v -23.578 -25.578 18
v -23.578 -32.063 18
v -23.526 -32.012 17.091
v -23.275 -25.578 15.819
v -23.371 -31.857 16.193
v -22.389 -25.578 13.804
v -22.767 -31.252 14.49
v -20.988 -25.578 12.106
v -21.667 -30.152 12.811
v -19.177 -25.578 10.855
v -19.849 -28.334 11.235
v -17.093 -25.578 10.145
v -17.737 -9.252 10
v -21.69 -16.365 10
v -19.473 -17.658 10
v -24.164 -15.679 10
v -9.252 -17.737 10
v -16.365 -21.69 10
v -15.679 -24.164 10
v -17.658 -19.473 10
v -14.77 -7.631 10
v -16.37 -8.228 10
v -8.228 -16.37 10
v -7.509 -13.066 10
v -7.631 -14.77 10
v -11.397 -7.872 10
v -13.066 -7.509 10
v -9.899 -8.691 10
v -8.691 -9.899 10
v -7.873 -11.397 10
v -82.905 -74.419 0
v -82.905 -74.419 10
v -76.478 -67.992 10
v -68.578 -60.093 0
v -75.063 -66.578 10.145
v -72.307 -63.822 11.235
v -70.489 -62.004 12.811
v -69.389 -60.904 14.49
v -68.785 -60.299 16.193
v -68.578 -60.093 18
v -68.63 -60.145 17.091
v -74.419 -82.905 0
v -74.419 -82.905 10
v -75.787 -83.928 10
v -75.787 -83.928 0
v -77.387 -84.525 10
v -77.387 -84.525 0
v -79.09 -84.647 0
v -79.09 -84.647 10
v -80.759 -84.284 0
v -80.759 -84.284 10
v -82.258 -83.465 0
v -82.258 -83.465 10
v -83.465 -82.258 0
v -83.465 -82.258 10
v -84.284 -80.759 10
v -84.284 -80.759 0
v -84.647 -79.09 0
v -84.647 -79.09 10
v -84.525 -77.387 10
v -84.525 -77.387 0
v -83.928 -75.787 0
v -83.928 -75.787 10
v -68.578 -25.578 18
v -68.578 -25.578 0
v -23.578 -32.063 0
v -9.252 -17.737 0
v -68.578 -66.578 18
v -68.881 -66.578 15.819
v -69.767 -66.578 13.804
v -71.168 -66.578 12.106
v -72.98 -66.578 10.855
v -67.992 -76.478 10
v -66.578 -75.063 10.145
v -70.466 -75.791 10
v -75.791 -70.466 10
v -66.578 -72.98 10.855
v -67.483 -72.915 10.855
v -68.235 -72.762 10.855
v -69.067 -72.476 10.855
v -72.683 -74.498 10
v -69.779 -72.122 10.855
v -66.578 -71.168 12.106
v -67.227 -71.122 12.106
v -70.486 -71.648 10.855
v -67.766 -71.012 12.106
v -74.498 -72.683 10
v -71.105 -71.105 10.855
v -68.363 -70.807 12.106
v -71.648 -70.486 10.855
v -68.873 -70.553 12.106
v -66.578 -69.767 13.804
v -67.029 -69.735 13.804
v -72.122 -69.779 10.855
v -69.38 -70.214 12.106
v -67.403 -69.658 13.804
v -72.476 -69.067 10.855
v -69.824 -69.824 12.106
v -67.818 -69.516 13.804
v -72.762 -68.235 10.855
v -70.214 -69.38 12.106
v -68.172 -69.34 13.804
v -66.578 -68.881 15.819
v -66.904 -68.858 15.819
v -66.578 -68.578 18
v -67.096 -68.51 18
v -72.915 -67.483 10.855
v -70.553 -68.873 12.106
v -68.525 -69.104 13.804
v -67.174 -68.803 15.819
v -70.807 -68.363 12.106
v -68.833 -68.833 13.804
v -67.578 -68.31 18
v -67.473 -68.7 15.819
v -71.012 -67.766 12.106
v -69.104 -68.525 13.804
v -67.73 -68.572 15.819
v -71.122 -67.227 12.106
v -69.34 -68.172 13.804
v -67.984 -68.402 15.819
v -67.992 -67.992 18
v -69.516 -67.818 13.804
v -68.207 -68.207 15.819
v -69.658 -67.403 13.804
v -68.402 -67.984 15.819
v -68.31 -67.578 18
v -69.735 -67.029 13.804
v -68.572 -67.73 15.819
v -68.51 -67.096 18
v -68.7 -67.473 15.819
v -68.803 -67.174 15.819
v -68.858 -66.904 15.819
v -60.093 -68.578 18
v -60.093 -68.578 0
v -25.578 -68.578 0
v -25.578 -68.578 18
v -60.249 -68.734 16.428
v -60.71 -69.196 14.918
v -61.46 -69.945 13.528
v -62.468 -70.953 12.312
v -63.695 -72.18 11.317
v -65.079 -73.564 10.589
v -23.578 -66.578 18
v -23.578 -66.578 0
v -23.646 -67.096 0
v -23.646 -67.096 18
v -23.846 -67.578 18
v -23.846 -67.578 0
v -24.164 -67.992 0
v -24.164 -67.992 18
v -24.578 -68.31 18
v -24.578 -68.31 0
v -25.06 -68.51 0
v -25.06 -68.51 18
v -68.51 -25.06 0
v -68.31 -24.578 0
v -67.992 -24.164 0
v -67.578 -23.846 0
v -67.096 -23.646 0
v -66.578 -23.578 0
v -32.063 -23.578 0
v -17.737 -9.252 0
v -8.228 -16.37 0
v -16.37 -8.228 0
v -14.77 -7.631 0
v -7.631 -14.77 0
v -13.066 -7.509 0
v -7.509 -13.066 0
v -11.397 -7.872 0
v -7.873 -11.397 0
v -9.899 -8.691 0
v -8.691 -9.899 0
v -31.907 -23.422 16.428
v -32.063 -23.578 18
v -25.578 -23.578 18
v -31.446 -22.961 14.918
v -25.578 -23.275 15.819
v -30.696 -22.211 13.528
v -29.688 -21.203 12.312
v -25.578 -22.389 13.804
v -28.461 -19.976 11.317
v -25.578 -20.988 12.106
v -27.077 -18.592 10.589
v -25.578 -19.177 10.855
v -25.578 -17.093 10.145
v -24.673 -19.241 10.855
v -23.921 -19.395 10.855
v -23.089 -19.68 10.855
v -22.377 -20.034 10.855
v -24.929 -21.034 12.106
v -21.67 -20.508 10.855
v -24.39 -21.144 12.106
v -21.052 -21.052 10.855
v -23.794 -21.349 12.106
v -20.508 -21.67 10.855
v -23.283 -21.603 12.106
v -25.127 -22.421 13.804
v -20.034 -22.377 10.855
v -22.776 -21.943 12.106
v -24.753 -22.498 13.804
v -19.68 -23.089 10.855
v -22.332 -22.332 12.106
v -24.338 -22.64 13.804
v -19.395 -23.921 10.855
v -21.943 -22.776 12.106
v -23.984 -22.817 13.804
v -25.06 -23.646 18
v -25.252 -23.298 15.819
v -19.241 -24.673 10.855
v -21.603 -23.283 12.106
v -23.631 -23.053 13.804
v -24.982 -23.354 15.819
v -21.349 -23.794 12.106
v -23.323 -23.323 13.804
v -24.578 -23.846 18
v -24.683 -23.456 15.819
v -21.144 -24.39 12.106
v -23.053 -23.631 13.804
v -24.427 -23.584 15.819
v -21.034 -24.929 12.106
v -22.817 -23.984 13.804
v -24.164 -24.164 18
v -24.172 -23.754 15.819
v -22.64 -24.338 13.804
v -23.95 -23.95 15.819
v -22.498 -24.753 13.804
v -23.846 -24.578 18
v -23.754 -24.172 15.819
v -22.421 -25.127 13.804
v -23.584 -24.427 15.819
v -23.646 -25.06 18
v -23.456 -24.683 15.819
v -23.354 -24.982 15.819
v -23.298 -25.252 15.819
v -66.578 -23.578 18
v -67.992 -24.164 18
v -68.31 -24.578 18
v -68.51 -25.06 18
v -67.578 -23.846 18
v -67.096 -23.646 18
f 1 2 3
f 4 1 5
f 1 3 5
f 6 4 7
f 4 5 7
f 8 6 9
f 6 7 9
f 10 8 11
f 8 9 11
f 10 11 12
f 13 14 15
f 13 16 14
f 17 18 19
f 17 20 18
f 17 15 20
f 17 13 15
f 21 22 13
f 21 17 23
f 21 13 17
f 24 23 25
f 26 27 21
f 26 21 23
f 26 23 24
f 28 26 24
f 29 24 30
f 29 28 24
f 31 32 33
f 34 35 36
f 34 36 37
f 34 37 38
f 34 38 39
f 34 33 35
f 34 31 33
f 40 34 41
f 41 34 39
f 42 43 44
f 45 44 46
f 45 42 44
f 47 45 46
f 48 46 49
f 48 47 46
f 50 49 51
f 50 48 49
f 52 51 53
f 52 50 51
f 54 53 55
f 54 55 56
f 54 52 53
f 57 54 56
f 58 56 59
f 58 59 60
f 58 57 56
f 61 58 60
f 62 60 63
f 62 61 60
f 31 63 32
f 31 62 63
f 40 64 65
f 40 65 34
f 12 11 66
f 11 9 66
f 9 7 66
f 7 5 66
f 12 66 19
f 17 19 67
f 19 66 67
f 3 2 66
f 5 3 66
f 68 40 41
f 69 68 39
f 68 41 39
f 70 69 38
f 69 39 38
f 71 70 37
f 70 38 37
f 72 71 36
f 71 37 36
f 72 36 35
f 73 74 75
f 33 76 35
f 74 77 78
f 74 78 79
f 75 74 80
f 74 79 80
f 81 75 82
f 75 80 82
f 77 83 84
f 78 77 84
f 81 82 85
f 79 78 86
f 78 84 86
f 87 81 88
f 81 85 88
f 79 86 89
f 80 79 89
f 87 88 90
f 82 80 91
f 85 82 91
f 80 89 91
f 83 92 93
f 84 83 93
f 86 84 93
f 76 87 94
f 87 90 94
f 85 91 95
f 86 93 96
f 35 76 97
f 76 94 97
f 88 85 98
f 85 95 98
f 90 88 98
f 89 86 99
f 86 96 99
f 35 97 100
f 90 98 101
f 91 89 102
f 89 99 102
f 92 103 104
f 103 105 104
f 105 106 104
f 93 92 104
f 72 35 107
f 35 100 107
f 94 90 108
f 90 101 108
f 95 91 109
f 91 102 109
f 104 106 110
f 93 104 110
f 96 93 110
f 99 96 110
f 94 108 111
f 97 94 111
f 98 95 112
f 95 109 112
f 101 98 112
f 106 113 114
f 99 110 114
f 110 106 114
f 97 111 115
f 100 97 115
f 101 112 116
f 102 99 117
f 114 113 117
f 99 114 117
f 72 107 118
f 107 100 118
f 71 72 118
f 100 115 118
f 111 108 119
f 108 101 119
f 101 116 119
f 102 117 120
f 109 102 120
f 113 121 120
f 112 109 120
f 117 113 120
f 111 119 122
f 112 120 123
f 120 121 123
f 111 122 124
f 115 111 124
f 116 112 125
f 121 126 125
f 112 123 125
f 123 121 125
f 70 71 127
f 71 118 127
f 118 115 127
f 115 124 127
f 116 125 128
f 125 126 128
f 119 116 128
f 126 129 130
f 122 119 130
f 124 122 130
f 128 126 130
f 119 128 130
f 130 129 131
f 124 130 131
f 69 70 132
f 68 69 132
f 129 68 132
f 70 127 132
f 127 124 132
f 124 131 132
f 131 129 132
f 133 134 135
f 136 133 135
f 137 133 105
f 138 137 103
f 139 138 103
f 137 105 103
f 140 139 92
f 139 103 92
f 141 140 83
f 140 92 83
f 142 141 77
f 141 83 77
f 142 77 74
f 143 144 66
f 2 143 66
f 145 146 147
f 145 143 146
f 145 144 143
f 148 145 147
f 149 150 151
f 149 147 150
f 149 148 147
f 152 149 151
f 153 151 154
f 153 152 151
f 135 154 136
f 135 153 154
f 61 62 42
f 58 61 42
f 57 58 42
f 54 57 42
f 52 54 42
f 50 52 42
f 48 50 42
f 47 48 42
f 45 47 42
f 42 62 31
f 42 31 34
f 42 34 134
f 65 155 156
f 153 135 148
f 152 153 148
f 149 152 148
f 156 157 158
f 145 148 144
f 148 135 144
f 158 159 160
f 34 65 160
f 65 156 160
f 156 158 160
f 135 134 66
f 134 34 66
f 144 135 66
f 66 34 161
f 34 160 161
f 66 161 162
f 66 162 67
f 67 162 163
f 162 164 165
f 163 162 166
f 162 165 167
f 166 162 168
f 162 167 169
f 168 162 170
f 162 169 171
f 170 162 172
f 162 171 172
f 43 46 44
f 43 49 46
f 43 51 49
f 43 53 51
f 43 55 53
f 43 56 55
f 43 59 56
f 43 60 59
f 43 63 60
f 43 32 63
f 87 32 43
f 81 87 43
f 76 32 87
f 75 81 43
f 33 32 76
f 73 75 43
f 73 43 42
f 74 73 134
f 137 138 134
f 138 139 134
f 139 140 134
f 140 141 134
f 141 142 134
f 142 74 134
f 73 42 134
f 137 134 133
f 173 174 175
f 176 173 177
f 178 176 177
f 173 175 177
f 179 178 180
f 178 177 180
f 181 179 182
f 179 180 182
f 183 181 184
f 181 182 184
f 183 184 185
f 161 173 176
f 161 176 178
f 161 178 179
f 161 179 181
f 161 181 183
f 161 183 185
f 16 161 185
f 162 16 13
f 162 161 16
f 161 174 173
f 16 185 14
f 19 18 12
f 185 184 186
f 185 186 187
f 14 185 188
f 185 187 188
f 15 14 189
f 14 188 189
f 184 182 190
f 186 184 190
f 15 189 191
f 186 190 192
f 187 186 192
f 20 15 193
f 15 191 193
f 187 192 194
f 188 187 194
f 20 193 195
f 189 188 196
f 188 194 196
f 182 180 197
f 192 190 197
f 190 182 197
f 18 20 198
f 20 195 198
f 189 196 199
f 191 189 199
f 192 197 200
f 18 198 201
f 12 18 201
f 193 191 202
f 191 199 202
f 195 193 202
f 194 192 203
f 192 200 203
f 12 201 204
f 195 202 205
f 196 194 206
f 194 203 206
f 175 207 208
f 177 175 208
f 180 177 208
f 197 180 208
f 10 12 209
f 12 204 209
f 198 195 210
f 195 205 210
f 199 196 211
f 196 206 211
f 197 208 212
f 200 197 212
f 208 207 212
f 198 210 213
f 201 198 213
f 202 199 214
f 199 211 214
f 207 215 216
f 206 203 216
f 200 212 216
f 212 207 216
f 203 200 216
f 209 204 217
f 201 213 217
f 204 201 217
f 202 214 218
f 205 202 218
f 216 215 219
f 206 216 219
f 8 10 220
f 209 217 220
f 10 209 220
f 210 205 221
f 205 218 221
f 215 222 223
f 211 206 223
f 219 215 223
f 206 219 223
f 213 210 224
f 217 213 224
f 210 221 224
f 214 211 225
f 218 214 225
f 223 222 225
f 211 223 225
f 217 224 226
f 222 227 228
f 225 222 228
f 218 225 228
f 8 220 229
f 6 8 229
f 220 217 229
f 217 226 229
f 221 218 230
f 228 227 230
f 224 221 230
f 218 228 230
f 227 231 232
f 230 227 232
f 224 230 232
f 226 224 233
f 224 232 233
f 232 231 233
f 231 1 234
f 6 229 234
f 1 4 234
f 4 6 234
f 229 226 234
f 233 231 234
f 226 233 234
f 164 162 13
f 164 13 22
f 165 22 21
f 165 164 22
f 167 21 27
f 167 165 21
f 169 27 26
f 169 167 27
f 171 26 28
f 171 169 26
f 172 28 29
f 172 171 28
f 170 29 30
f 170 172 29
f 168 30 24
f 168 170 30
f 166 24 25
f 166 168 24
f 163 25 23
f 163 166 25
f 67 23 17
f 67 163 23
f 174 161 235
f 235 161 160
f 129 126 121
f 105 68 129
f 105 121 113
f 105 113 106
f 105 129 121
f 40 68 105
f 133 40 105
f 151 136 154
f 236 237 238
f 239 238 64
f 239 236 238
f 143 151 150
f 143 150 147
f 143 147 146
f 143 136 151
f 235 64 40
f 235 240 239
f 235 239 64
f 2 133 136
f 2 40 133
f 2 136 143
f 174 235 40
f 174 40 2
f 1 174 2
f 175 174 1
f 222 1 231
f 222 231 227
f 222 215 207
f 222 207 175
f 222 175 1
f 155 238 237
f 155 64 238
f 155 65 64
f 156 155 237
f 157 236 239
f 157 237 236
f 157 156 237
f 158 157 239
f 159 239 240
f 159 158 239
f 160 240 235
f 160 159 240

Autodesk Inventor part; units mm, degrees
ref_plane "YZ Plane" through (0, 0, 0) normal (1, 0, 0) x (0, 1, 0)
ref_plane "XZ Plane" through (0, 0, 0) normal (0, 1, 0) x (-1, 0, 0)
ref_plane "XY Plane" through (0, 0, 0) normal (0, 0, 1) x (1, 0, 0)
ref_plane "Work Plane1" through (12.8382, -4.6513, 0) normal (0, 0, 1) x (1, 0, 0)
sketch "Sketch1" plane through (12.8382, -4.6513, 0) normal (0, 0, 1) x (1, 0, 0)
  circle A0 centre (-91.5002, -74.0108) radius 6
  circle A1 centre (-26.3324, -8.8429) radius 6
  ellipse E0 centre (-91.5002, -74.0108) end of major axis (-87.52, -70.0305) minor radius 5.6 (-97.1147, -74.0397) -> (-91.5291, -79.6253) ccw projected
  line L0 (-67.9442, -79.6253) -> (-91.5291, -79.6253) projected
  line L1 (-67.9442, -79.6253) -> (-49.8884, -79.6253) projected
  line L2 (-26.3034, -79.6253) -> (-49.8884, -79.6253) projected
  ellipse E1 centre (-26.3324, -74.0108) end of major axis (-22.3521, -77.991) minor radius 5.6 (-26.3034, -79.6253) -> (-20.7179, -74.0397) ccw projected
  line L3 (-20.7179, -8.814) -> (-20.7179, -74.0397) projected
  ellipse E2 centre (-26.3324, -8.8429) end of major axis (-22.3521, -4.8627) minor radius 5.6 (-20.7179, -8.814) -> (-26.3034, -3.2284) ccw projected
  line L4 (-91.5291, -3.2284) -> (-26.3034, -3.2284) projected
  ellipse E3 centre (-91.5002, -8.8429) end of major axis (-87.52, -12.8231) minor radius 5.6 (-91.5291, -3.2284) -> (-97.1147, -8.814) ccw projected
  line L5 (-97.1147, -74.0397) -> (-97.1147, -8.814) projected
  line L6 (-79.4163, -63.9268) -> (-38.4163, -63.9268)
  line L7 (-36.4163, -61.9268) -> (-36.4163, -20.9268)
  line L8 (-38.4163, -18.9268) -> (-79.4163, -18.9268)
  line L9 (-81.4163, -20.9268) -> (-81.4163, -61.9268)
  line L10 (-58.9163, -79.6253) -> (-58.9163, -3.2284)
  line L11 (-97.1147, -41.4268) -> (-20.7179, -41.4268)
  arc A2 (-81.4163, -61.9268) -> (-79.4163, -63.9268) centre (-79.4163, -61.9268) ccw
  arc A3 (-38.4163, -63.9268) -> (-36.4163, -61.9268) centre (-38.4163, -61.9268) ccw
  arc A4 (-36.4163, -20.9268) -> (-38.4163, -18.9268) centre (-38.4163, -20.9268) ccw
  arc A5 (-79.4163, -18.9268) -> (-81.4163, -20.9268) centre (-79.4163, -20.9268) ccw
  line L12 (-87.2576, -78.2534) -> (-22.0897, -13.0855)
  line L13 (-95.7429, -69.7681) -> (-30.575, -4.6003)
  point P0 (-12.8382, 4.6513)
  point P1 (-81.4163, -63.9268)
  point P2 (-36.4163, -18.9268)
  point P3 (-36.4163, -63.9268)
  point P4 (-72.931, -63.9268)
  point P5 (-36.4163, -27.4121)
  point P6 (-44.9016, -18.9268)
  point P7 (-81.4163, -55.4416)
  point P8 (-29.8782, -23.5781)
  point P9 (-75.1162, -63.9268)
  dimension "d0" = 12
  dimension "d1" = 12
  dimension "d2" = 45
  dimension "d3" = 45
  dimension "d4" = 2
extrude "Extrusion1" add sketch "Sketch1" along normal blind 18 contours A0 L0 E0 L5 | A0 L13 L9 A2 L6 L12 | L5 E0 L0 A0 | L13 L11 L10 L12 L6 A2 L9 | L9 L11 L13 | L12 L10 L6 | L9 A5 L8 L10 L13 L11 | L13 L10 L11 | L10 L12 L11 L7 A3 L6 | L10 L11 L12 | L10 L13 L8 A4 L7 L12 L11 | L10 L8 L13 | L12 L7 L11 | L13 A1 L12 L7 A4 L8 | A1 L4 E2 L3 | A1 L3 E2 L4
sketch "Sketch2" plane through (12.8382, -4.6513, 18) normal (0, 0, 1) x (1, 0, 0)
  line L0 (-44.9016, -18.9268) -> (-79.4163, -18.9268) projected
  arc A0 (-79.4163, -18.9268) -> (-81.4163, -20.9268) centre (-79.4163, -20.9268) ccw projected
  line L1 (-81.4163, -20.9268) -> (-81.4163, -55.4416) projected
  line L2 (-36.4163, -61.9268) -> (-36.4163, -27.4121) projected
  arc A1 (-38.4163, -63.9268) -> (-36.4163, -61.9268) centre (-38.4163, -61.9268) ccw projected
  line L3 (-72.931, -63.9268) -> (-38.4163, -63.9268) projected
  line L4 (-62.1589, -18.9268) -> (-55.6737, -63.9268)
  line L5 (-36.4163, -44.6695) -> (-81.4163, -38.1842)
  line L6 (-44.9016, -18.9268) -> (-79.4163, -18.9268)
  line L7 (-81.4163, -20.9268) -> (-81.4163, -55.4416)
  arc A2 (-79.4163, -18.9268) -> (-81.4163, -20.9268) centre (-79.4163, -20.9268) ccw
  line L8 (-81.4163, -27.4121) -> (-81.4163, -61.9268)
  arc A3 (-81.4163, -61.9268) -> (-79.4163, -63.9268) centre (-79.4163, -61.9268) ccw
  line L9 (-79.4163, -63.9268) -> (-44.9016, -63.9268)
  line L10 (-72.931, -63.9268) -> (-38.4163, -63.9268)
  arc A4 (-38.4163, -63.9268) -> (-36.4163, -61.9268) centre (-38.4163, -61.9268) ccw
  line L11 (-36.4163, -61.9268) -> (-36.4163, -27.4121)
  line L12 (-36.4163, -55.4416) -> (-36.4163, -20.9268)
  arc A5 (-36.4163, -20.9268) -> (-38.4163, -18.9268) centre (-38.4163, -20.9268) ccw
  line L13 (-38.4163, -18.9268) -> (-72.931, -18.9268)
  line L14 (-81.4163, -55.4416) -> (-100.4764, -69.4227)
  line L15 (-100.4764, -69.4227) -> (-100.4764, -80.6902)
  line L16 (-100.4764, -80.6902) -> (-89.2076, -83.945)
  line L17 (-89.2076, -83.945) -> (-75.1931, -71.7586)
  line L18 (-75.1931, -71.7586) -> (-72.931, -63.9268)
  line L19 (-44.9016, -18.9268) -> (-41.3617, -6.671)
  line L20 (-41.3617, -6.671) -> (-27.2892, 1.0126)
  line L21 (-27.2892, 1.0126) -> (-19.5179, 0.2355)
  line L22 (-19.5179, 0.2355) -> (-4.3296, -12.1655)
  line L23 (-4.3296, -12.1655) -> (-5.4222, -23.0912)
  line L24 (-5.4222, -23.0912) -> (-36.4163, -27.4121)
  point P0 (-12.8382, 4.6513)
  point P1 (-58.9163, -41.4268)
  point P2 (-81.4163, -55.4416)
  point P3 (-72.931, -63.9268)
  point P4 (-36.4163, -27.4121)
  point P5 (-43.7192, -14.8334)
  point P6 (-32.0634, -23.5781)
  point P7 (-25.5781, -68.5781)
  point P8 (-23.5781, -32.0634)
  point P9 (-32.0634, -23.5781)
  point P10 (-38.4163, -63.9268)
  dimension "d9" = 360
extrude "Extrusion2" cut sketch "Sketch2" against normal blind 8 contours L19 L20 L21 L22 L23 L24 L12 A5 L13 | L18 L17 L16 L15 L14 L8 A3 L9
fillet "Fillet1" radius 8 6 edges at (-28.8207, -23.5781, 10) (-23.5781, -28.8207, 10) (-24.1639, -24.1639, 10) (-63.3355, -68.5781, 10) (-68.5781, -63.3355, 10) (-67.9923, -67.9923, 10)
equation "\"d1\" = d0"
equation "\"d3\" = d2"
properties part number "base" material "ABS Plastic"
